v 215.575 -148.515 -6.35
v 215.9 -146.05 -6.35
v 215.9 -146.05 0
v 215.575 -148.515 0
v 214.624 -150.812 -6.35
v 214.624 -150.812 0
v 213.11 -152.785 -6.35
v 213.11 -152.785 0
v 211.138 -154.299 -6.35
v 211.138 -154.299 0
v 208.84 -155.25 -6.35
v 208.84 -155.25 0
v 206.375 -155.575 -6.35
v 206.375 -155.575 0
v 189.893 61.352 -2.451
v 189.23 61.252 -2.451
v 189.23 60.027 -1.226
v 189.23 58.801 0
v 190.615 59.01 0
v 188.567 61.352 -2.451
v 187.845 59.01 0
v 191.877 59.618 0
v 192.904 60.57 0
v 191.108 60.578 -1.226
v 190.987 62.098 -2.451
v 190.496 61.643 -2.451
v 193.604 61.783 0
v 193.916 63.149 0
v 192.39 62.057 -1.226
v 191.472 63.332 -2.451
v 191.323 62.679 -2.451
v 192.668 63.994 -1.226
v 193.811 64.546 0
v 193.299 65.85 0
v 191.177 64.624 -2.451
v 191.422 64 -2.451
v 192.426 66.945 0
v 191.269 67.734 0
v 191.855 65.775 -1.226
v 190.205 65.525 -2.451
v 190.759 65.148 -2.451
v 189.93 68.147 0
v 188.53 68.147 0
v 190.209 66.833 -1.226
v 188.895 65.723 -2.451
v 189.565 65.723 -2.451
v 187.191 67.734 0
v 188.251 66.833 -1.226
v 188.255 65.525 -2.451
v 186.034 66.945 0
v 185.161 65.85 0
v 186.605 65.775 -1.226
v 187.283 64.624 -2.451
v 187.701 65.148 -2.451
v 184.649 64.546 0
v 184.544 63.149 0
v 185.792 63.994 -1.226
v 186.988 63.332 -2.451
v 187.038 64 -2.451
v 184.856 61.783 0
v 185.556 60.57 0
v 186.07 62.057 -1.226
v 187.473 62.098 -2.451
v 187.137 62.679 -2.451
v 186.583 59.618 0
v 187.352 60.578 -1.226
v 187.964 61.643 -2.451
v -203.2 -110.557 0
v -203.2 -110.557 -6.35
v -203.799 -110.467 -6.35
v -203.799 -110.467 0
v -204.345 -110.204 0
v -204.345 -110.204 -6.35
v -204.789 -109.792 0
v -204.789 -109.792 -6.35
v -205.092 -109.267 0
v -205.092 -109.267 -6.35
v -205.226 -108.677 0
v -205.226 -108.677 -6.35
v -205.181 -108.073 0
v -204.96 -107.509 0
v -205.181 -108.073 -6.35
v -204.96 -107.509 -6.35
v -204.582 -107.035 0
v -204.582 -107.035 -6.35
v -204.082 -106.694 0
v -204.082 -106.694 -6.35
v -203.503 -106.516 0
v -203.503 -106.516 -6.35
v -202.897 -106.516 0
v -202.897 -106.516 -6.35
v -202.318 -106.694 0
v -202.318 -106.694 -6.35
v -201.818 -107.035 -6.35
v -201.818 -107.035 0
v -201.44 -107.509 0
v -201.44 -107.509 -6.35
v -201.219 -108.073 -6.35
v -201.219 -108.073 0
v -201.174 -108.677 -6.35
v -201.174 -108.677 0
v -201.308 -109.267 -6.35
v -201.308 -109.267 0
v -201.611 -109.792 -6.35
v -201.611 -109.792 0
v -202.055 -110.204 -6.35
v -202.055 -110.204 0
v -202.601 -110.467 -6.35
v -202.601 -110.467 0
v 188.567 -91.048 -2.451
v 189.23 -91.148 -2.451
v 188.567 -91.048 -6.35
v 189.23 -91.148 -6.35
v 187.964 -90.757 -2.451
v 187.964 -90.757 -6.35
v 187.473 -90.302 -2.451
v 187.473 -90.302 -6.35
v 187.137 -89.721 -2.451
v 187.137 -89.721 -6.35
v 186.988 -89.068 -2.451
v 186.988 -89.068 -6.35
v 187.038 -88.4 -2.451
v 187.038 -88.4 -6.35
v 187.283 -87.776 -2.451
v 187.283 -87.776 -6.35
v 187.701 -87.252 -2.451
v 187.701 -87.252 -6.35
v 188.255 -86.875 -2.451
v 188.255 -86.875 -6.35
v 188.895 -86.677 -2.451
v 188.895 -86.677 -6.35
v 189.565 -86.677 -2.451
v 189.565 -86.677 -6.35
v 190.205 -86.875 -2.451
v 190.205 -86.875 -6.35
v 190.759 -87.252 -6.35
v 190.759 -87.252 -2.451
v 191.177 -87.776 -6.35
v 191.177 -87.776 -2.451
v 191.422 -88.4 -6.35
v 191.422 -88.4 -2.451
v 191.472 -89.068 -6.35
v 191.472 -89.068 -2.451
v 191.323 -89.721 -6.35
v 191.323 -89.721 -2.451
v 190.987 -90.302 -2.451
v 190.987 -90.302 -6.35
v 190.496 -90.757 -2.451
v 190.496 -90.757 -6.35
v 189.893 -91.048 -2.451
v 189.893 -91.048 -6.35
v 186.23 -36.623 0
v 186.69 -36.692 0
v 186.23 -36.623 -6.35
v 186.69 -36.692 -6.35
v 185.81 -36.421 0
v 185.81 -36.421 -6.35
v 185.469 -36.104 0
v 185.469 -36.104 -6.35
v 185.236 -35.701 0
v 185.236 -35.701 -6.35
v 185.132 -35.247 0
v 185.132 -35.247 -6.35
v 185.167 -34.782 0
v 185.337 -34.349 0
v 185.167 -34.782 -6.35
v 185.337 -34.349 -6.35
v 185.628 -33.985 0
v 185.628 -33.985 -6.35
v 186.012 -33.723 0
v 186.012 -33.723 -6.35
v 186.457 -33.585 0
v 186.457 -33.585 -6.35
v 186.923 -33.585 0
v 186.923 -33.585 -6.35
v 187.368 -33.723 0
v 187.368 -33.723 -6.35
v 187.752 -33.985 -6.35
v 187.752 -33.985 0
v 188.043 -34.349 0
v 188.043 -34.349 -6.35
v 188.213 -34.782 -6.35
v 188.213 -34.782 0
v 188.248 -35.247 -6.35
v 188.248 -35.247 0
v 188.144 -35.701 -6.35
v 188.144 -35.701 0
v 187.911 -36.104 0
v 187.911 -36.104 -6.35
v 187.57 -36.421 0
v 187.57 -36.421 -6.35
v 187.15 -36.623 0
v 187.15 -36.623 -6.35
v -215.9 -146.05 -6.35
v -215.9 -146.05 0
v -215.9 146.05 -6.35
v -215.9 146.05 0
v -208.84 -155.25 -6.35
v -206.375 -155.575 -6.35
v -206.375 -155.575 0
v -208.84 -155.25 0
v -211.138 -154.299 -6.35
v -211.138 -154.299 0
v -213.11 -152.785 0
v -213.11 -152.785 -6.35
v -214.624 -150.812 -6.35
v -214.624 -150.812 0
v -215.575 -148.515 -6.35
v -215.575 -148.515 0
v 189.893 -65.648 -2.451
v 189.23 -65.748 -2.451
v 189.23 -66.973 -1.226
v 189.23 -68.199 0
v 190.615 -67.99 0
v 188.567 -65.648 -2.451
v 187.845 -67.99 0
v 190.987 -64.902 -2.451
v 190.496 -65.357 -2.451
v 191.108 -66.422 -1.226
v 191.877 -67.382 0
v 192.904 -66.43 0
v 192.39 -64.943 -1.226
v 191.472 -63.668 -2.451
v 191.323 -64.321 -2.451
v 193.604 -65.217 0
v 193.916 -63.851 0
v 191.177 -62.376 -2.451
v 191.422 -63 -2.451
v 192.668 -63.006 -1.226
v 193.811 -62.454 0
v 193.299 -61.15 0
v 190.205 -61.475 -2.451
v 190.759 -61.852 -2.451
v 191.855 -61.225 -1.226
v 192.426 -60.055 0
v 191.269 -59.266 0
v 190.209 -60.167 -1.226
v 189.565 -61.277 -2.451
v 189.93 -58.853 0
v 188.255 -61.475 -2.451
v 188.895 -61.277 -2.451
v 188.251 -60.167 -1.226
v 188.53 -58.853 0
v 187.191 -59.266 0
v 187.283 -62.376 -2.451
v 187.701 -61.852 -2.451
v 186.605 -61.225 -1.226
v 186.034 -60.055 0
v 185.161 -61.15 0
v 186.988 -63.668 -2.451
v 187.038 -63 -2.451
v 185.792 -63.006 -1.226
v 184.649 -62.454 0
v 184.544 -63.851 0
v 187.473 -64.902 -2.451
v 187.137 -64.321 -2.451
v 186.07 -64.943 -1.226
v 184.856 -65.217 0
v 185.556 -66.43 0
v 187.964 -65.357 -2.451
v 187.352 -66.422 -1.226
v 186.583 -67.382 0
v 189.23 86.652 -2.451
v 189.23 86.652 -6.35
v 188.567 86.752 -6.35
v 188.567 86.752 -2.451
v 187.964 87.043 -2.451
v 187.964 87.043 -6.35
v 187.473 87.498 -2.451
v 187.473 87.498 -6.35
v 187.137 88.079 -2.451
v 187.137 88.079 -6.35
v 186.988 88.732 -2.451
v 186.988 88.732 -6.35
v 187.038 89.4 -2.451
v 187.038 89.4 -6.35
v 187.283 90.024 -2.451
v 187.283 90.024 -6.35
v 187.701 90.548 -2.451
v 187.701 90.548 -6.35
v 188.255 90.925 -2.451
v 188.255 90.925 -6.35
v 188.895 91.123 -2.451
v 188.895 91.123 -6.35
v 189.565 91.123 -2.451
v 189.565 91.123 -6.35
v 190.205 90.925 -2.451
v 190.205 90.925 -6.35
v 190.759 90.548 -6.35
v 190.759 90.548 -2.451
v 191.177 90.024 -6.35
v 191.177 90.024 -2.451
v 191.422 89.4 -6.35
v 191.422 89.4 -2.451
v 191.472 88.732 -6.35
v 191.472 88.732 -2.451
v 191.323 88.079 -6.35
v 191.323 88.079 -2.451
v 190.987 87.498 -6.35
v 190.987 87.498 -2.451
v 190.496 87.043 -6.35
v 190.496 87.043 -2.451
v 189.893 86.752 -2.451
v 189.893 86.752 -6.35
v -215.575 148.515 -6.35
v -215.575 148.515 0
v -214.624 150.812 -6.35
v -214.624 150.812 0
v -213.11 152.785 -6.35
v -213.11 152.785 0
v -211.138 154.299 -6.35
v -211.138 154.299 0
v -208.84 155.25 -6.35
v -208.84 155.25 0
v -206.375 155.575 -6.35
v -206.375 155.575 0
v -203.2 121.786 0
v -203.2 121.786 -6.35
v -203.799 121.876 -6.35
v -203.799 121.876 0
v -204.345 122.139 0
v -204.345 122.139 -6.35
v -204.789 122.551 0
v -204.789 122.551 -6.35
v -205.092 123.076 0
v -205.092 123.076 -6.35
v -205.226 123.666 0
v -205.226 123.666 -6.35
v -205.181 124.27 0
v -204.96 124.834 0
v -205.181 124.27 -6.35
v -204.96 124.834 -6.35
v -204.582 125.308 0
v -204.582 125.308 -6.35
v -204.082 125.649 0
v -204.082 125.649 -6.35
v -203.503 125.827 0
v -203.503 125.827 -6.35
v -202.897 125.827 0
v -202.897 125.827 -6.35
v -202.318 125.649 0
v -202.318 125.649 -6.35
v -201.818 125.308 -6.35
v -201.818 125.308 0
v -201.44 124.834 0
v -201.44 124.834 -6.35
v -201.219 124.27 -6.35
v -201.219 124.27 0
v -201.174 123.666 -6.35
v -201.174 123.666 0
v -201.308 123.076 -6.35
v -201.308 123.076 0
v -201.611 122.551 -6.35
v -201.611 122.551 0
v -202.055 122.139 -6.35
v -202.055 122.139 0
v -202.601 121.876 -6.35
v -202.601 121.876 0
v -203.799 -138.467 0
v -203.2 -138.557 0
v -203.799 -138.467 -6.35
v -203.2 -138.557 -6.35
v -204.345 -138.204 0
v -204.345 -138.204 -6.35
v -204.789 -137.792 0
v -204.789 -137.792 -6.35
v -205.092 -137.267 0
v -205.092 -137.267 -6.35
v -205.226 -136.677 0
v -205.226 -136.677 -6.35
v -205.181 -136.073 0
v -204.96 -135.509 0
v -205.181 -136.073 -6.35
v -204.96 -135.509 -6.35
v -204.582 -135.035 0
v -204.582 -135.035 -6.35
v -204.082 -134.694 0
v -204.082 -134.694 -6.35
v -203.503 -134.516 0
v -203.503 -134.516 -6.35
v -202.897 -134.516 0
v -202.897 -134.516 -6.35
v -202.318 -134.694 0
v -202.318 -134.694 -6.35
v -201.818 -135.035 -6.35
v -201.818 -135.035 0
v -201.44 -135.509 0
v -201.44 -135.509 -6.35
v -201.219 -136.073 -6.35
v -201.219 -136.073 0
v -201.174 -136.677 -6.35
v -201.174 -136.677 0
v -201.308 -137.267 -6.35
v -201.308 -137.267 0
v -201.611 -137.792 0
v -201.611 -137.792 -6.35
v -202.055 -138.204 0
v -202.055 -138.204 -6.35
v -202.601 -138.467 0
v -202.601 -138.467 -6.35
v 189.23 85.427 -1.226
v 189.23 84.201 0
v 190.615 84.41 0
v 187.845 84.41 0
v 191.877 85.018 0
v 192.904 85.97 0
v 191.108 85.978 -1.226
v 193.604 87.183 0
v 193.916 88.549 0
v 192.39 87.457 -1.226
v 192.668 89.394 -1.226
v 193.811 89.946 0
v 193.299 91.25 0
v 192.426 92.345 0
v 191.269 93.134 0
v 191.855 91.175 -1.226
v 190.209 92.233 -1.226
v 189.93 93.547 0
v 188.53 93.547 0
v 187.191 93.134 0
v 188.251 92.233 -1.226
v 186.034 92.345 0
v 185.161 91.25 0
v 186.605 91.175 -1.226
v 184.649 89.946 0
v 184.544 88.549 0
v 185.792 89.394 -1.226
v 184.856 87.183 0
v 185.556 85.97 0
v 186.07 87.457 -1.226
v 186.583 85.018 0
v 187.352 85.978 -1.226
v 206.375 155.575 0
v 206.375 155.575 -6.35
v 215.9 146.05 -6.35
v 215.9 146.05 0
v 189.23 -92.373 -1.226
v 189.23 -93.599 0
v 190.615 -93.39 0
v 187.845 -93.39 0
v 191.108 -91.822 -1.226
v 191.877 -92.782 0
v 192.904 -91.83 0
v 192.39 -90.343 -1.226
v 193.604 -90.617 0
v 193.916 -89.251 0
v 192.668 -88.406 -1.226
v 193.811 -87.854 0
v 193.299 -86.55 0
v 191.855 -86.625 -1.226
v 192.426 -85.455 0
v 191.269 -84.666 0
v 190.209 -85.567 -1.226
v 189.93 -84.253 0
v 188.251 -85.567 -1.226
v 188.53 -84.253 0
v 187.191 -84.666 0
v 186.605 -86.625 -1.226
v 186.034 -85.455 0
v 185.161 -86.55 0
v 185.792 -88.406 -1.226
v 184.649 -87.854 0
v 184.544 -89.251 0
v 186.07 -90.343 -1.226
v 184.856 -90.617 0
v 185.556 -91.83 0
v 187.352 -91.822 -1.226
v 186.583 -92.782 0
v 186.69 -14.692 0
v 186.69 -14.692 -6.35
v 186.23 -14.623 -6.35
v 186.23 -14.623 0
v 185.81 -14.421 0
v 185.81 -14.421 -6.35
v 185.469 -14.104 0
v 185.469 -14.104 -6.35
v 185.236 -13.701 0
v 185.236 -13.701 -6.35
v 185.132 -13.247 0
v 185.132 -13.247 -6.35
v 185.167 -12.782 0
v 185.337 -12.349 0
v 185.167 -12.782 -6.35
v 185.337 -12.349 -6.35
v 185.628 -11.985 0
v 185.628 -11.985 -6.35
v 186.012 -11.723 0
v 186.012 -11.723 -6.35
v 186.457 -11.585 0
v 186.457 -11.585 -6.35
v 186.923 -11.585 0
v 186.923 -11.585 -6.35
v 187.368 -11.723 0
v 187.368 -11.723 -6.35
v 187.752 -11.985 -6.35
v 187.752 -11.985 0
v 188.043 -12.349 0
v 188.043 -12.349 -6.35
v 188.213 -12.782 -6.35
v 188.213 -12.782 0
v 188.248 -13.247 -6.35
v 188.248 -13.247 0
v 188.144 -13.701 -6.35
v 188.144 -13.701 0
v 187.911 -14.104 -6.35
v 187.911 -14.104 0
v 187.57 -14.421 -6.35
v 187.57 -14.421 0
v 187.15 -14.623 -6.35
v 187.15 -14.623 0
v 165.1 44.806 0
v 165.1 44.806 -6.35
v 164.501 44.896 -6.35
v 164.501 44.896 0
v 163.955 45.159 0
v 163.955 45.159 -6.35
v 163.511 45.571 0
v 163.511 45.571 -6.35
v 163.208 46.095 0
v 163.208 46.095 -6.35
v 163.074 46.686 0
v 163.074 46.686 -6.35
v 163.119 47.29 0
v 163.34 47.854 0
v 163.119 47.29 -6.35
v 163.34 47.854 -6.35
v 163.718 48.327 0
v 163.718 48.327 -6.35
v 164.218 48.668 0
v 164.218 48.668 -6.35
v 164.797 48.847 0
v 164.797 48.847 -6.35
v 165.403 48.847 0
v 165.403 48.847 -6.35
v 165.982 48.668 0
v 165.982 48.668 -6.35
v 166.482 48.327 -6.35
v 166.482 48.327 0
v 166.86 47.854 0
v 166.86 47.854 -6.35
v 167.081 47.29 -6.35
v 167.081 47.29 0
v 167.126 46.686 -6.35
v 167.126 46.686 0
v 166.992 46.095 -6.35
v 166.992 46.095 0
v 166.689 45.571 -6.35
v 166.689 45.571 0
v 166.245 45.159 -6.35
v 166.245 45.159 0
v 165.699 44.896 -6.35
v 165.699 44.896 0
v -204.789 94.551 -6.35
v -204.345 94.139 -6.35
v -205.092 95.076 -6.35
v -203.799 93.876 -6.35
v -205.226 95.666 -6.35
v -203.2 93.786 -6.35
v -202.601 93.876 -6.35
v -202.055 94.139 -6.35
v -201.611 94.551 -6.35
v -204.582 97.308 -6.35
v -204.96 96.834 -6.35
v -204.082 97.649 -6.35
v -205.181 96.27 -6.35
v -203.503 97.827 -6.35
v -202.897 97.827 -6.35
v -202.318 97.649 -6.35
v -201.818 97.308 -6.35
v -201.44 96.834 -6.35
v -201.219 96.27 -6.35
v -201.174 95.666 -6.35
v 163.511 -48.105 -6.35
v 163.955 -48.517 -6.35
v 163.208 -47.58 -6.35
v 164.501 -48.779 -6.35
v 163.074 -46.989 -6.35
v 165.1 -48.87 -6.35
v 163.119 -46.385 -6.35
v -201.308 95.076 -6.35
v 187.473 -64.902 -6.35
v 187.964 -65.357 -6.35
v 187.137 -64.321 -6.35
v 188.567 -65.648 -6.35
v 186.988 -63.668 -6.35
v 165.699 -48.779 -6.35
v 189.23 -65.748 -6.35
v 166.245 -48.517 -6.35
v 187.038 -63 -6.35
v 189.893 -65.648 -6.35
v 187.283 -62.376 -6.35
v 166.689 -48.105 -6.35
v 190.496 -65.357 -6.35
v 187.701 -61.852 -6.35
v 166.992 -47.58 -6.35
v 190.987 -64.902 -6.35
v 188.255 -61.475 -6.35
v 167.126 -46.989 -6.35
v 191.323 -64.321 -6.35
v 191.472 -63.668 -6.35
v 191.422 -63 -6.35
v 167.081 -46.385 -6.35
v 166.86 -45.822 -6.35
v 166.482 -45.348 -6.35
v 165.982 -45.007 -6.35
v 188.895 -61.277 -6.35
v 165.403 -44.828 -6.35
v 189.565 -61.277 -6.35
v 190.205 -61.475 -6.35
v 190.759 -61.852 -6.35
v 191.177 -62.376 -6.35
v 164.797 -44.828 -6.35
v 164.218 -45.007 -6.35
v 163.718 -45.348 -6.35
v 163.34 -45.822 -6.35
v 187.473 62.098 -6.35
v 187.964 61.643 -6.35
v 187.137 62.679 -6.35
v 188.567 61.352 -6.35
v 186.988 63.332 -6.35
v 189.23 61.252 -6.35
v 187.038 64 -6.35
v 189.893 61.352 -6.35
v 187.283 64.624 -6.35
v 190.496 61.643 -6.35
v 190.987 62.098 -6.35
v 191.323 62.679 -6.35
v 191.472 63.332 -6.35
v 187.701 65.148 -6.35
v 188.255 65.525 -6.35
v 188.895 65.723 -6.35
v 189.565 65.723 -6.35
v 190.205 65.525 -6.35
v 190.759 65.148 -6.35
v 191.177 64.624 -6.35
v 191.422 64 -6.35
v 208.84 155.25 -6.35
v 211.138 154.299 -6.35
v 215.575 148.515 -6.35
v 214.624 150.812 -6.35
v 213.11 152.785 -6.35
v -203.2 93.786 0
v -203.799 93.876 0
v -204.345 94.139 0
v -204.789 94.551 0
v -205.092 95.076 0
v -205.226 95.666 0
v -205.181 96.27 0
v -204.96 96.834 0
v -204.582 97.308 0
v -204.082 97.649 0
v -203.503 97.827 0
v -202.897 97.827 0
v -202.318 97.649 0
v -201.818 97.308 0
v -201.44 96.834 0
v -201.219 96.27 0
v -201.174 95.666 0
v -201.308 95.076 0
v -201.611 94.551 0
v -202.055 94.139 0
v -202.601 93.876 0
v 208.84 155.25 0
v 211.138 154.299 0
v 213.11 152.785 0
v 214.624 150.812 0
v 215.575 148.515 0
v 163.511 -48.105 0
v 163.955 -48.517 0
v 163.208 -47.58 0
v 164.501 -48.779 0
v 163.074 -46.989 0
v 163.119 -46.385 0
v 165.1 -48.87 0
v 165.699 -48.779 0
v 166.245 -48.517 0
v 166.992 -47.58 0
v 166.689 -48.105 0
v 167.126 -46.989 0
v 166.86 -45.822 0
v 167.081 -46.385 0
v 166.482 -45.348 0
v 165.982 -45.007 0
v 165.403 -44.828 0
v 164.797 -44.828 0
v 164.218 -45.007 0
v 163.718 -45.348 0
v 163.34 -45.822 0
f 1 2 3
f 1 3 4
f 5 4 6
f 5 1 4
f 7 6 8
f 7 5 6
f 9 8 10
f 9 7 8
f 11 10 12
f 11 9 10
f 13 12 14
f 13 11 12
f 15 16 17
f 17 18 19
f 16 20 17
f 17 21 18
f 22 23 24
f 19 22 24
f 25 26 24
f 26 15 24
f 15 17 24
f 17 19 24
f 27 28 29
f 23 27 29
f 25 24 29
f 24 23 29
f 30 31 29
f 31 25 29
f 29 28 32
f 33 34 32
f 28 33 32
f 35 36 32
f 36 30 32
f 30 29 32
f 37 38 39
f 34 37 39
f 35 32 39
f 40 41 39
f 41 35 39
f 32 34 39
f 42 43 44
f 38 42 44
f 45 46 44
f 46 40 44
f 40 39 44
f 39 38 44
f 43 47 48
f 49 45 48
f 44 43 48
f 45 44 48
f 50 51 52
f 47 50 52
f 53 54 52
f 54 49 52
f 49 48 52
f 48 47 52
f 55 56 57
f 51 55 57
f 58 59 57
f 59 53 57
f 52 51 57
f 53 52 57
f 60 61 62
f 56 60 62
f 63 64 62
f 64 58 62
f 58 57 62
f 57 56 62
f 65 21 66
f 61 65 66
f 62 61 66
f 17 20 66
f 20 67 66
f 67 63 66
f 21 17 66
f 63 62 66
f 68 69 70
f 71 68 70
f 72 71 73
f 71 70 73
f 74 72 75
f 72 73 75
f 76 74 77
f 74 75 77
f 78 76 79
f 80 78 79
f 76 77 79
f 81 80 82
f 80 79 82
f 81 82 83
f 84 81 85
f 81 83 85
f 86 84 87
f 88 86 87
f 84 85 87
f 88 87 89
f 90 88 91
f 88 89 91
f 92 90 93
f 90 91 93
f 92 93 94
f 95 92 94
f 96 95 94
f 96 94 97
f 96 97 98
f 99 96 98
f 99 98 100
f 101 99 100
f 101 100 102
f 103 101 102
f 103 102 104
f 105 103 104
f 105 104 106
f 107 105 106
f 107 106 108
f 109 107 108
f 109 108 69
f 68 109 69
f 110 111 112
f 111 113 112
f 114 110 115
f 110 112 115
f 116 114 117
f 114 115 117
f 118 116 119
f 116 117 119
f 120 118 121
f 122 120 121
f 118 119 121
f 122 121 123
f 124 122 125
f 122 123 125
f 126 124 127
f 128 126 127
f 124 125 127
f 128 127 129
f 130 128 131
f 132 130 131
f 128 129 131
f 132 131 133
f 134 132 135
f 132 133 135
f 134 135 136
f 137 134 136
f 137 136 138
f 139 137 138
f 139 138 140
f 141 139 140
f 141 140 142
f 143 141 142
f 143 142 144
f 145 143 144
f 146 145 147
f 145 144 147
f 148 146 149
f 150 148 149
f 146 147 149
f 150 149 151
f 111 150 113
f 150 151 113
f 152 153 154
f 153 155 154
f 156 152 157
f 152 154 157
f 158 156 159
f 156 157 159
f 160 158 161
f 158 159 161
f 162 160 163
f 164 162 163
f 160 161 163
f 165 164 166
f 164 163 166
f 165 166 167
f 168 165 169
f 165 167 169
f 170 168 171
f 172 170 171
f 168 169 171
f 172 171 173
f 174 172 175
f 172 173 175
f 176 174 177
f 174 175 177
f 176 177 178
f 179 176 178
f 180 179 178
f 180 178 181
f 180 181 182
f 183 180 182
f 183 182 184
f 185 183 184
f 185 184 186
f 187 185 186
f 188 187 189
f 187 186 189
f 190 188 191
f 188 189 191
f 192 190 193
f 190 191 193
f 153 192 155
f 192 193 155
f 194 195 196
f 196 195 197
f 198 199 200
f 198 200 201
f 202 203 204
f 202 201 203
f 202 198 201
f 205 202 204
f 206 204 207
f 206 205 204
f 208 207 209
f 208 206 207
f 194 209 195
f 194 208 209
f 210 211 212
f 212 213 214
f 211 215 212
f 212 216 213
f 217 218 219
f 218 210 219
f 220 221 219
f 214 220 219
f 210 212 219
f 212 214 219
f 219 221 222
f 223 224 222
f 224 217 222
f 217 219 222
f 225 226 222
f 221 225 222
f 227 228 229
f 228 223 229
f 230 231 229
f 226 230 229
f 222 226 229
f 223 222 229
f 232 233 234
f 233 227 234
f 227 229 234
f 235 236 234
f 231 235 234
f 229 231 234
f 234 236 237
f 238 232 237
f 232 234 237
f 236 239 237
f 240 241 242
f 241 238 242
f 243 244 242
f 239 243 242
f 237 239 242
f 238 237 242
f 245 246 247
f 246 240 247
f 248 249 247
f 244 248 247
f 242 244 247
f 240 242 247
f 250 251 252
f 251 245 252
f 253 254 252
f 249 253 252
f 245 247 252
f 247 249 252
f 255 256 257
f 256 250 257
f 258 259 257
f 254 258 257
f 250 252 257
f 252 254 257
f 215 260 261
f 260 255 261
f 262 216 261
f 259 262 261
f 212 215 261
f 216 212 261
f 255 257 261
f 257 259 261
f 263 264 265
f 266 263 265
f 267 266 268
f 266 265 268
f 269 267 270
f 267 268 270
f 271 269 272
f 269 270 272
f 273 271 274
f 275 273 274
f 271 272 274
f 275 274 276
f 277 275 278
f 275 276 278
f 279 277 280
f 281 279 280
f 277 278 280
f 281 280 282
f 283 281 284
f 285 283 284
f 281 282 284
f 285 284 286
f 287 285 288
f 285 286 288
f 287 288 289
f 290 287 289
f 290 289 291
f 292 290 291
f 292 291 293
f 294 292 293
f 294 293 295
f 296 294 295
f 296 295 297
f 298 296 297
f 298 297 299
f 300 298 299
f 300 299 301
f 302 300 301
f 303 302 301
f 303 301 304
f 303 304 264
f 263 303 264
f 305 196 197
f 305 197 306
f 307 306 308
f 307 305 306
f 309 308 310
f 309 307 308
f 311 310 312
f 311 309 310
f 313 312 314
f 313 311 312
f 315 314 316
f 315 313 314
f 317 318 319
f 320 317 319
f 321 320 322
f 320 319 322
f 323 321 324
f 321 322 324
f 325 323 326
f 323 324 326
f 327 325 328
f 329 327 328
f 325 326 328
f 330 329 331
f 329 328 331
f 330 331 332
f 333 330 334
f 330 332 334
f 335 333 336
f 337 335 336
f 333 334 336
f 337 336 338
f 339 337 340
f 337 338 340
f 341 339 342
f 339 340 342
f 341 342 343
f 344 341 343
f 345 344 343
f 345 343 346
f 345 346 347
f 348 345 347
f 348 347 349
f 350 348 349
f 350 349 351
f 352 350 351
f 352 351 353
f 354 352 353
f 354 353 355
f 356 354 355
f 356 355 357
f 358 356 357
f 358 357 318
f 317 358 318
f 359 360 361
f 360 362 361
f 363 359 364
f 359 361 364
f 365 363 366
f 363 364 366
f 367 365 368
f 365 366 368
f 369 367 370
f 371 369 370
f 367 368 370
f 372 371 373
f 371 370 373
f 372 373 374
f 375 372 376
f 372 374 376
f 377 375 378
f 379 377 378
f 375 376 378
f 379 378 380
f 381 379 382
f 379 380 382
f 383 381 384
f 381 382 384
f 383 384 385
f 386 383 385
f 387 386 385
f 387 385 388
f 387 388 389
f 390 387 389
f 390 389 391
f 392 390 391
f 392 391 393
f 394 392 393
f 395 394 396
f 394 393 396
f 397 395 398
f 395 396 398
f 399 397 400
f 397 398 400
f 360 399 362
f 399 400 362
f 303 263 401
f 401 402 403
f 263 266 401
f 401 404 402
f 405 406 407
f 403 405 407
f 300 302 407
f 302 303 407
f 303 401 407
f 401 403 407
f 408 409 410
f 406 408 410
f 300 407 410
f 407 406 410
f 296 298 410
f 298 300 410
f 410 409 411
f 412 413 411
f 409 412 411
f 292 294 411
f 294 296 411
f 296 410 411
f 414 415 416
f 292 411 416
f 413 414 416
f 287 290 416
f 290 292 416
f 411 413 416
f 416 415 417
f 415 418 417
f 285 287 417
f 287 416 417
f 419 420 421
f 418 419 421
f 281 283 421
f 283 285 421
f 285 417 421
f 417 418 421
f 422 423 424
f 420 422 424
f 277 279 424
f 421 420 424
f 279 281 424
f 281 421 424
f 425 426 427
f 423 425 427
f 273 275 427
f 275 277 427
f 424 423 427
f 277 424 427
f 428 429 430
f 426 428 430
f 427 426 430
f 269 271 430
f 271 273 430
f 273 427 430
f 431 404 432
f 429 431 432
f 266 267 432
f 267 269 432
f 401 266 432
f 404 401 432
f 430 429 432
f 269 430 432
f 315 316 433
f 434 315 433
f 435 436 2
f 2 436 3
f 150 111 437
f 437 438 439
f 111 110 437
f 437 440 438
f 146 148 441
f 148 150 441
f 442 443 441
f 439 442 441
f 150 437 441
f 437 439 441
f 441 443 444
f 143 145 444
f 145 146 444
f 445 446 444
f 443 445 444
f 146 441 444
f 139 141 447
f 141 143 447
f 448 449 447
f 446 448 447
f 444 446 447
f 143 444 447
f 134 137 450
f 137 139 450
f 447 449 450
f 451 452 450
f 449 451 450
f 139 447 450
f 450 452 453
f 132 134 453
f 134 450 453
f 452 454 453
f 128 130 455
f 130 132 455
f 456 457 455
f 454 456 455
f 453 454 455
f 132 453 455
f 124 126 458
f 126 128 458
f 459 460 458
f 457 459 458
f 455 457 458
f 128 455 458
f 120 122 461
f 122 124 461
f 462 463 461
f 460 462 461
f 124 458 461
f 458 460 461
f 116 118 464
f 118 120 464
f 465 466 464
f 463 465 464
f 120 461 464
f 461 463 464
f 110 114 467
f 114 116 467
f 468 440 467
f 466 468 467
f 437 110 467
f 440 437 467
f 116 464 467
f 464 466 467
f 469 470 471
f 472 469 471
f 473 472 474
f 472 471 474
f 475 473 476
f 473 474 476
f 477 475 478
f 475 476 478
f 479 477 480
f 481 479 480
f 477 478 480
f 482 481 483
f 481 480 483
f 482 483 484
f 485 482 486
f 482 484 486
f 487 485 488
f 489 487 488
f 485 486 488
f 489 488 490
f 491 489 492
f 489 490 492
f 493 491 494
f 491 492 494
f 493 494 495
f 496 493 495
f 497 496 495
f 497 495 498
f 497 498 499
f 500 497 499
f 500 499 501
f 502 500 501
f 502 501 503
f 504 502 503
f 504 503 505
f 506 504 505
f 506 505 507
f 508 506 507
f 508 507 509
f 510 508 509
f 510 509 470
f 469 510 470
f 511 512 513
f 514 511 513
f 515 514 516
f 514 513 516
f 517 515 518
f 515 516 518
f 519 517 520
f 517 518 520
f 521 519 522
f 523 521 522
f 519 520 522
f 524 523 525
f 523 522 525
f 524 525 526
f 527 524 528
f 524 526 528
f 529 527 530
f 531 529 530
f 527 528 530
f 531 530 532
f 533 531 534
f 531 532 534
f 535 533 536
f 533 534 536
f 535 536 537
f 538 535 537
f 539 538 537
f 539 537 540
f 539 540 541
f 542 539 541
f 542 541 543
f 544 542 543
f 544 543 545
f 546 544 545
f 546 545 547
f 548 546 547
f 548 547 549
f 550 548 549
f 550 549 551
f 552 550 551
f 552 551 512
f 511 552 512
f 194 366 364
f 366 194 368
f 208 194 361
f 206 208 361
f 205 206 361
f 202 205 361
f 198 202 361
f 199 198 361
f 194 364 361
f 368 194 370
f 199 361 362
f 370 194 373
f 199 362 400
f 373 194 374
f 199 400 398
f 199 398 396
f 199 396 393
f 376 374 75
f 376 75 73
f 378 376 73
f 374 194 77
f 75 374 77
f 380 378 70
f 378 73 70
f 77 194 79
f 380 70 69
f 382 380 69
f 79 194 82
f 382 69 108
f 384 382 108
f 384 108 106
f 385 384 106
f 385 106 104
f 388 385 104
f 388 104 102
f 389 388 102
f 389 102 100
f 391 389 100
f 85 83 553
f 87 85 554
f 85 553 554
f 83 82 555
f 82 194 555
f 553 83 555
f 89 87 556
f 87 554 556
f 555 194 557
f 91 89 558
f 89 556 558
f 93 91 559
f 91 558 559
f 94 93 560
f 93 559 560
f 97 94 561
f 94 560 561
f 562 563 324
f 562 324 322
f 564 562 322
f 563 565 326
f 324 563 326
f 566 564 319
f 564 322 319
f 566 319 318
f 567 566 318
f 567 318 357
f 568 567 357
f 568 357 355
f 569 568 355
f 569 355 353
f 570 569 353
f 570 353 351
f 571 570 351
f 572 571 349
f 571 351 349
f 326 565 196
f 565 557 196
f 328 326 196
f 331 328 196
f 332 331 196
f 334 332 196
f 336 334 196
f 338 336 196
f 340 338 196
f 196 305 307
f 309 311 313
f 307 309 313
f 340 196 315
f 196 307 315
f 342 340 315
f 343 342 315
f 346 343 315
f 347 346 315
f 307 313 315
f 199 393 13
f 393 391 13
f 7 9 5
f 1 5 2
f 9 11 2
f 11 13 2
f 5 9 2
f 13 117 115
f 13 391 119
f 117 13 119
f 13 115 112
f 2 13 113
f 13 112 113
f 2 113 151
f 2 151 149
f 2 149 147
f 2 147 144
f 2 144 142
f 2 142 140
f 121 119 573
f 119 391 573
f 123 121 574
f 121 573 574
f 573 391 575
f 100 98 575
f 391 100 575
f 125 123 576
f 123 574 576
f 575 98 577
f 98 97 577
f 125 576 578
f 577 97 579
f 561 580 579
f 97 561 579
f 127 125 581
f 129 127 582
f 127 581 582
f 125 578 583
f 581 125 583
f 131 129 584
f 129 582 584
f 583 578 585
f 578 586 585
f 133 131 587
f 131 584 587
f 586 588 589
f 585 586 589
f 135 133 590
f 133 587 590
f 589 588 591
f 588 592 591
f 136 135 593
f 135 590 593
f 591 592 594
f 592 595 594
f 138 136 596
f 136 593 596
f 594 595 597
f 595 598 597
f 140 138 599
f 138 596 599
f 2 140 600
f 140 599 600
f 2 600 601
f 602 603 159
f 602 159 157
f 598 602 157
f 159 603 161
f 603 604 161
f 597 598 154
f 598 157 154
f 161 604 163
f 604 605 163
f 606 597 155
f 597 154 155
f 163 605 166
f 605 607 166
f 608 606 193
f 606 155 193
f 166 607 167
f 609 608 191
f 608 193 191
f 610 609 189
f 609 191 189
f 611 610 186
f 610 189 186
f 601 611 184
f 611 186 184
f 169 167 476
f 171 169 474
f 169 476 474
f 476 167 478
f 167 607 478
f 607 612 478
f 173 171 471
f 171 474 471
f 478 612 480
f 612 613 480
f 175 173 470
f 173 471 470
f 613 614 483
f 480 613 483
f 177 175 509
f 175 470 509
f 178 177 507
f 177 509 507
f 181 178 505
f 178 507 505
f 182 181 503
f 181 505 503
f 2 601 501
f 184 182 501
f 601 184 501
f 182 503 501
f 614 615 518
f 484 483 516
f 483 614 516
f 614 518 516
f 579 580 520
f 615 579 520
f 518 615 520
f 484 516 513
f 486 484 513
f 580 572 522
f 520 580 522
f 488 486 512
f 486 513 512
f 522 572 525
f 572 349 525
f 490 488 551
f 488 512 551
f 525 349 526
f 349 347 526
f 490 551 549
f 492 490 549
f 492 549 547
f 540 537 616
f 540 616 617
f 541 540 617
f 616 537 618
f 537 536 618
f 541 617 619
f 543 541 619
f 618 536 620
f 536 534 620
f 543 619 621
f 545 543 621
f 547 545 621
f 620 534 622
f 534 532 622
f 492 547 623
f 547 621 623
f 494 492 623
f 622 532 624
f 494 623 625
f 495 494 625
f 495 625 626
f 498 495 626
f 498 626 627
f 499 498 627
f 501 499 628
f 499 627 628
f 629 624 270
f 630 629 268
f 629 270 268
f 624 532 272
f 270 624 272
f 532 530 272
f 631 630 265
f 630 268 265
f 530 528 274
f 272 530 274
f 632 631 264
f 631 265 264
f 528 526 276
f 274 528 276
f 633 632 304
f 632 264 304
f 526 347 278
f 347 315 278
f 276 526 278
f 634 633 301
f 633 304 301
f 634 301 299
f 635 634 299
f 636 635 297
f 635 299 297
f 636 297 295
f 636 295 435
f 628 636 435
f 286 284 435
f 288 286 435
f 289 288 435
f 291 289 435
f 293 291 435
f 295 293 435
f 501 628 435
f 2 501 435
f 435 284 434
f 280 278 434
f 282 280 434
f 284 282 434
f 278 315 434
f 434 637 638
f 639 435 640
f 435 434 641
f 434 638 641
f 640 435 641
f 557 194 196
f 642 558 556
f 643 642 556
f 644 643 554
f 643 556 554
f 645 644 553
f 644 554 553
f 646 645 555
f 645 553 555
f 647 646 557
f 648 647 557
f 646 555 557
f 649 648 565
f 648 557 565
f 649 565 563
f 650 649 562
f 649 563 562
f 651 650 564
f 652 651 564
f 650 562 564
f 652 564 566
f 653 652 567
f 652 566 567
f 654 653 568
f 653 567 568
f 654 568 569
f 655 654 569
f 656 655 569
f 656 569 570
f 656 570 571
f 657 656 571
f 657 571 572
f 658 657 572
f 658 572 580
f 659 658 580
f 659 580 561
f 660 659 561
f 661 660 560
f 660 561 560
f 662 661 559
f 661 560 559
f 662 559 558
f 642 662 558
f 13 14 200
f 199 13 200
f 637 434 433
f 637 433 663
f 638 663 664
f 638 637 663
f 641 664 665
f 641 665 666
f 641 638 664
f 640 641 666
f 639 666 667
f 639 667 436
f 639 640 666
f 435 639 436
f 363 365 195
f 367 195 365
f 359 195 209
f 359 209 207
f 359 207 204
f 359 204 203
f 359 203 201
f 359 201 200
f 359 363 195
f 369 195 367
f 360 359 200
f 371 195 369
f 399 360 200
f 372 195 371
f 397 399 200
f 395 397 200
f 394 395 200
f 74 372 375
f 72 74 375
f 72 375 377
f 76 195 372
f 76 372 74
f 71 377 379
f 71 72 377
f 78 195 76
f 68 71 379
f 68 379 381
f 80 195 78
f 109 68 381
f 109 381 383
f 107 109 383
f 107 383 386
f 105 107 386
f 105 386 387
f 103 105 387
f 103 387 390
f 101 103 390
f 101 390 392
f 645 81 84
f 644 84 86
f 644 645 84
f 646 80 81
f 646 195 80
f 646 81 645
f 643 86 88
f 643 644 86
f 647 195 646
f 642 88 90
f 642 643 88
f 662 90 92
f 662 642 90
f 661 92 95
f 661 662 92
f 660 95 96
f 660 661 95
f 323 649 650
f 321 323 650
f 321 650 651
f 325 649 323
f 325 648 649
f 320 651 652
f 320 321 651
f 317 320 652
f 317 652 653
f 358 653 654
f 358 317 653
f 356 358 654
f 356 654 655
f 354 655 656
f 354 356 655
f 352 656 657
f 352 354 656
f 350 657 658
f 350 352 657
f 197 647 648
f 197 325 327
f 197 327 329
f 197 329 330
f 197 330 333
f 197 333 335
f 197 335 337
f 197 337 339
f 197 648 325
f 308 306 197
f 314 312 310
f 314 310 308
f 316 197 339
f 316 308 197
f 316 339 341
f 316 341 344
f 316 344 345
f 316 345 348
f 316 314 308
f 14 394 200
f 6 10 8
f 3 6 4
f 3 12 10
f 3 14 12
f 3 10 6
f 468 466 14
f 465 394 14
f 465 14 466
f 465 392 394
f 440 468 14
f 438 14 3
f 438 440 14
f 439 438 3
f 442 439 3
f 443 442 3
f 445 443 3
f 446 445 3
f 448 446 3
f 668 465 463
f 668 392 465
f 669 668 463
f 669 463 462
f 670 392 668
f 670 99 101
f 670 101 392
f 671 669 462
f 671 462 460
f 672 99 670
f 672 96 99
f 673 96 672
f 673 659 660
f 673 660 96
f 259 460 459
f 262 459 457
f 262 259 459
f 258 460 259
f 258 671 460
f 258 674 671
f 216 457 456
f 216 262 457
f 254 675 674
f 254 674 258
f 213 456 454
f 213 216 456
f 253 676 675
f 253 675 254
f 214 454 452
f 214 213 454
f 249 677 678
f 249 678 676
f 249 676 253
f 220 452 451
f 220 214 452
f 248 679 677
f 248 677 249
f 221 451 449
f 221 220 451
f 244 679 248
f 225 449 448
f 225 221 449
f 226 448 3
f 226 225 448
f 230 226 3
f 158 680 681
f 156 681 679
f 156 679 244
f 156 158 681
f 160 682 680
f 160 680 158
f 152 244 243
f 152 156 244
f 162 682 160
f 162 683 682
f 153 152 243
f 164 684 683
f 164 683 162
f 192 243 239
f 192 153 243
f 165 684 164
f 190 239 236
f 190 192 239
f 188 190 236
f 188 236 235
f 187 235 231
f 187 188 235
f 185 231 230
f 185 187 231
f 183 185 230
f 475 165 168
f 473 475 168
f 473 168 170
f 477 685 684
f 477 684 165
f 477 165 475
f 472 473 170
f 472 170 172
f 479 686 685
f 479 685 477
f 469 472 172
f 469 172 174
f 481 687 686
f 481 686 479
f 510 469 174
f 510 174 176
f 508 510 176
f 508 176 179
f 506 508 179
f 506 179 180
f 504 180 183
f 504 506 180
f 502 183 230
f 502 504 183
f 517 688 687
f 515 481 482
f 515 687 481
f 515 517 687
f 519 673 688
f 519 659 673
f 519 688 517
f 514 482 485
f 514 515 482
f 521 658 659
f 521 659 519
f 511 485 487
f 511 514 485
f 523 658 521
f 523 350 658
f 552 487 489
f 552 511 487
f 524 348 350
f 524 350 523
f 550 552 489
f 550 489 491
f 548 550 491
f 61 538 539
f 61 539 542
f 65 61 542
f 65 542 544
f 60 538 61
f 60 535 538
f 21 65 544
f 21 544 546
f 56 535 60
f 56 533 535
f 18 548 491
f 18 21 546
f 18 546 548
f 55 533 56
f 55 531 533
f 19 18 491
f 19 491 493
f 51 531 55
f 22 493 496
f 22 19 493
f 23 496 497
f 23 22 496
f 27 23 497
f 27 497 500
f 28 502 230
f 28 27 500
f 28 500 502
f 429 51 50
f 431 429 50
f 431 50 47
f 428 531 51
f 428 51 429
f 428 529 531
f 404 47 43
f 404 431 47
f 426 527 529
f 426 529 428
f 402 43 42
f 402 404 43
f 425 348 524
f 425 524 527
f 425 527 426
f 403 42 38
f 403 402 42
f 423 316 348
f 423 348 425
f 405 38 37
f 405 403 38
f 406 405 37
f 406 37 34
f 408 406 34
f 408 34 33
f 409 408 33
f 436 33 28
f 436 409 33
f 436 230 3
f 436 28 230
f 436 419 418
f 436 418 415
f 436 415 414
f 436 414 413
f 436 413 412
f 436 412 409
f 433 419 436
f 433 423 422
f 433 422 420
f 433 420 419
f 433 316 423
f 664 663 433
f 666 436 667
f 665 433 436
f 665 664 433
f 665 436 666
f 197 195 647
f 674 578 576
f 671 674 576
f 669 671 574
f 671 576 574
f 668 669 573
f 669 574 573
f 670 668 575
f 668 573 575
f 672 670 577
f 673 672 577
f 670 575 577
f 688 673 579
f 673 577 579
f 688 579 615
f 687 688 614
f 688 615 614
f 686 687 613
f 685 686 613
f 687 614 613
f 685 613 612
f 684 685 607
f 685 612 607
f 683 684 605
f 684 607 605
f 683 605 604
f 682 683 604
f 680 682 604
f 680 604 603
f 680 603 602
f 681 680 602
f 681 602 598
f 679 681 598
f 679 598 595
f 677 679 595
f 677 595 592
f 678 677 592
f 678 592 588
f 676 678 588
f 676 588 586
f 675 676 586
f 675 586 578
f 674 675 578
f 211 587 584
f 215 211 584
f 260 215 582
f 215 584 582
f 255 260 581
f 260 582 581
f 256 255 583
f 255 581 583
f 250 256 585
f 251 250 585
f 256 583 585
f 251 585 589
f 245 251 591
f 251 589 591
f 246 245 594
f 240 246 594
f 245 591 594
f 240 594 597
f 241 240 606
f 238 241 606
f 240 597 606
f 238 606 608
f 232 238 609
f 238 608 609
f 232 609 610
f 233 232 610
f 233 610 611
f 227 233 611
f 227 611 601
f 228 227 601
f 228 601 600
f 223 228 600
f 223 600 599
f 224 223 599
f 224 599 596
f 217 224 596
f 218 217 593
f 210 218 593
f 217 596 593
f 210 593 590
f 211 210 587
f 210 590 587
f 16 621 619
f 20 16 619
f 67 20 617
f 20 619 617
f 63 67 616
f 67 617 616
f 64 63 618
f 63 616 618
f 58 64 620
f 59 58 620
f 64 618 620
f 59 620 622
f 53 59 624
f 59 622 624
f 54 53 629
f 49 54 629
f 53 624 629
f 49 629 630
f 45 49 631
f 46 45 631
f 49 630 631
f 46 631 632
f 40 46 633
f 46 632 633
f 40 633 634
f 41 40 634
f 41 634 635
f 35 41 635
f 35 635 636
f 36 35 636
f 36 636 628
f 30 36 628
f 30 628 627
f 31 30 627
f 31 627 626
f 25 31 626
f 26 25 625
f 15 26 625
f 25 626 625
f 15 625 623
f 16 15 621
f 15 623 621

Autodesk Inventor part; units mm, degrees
ref_plane "YZ Plane" through (0, 0, 0) normal (1, 0, 0) x (0, 1, 0)
ref_plane "XZ Plane" through (0, 0, 0) normal (0, 1, 0) x (-1, 0, 0)
ref_plane "XY Plane" through (0, 0, 0) normal (0, 0, 1) x (1, 0, 0)
sketch "Sketch1" plane through (0, 0, 0) normal (0, 0, 1) x (1, 0, 0)
  line L0 (0, 217.805) -> (0, -217.805) projected
  line L1 (-302.26, 0) -> (302.26, 0) projected
  line L2 (215.9, -155.575) -> (-215.9, -155.575)
  line L3 (-215.9, -155.575) -> (-215.9, 155.575)
  line L4 (-215.9, 155.575) -> (215.9, 155.575)
  line L5 (215.9, 155.575) -> (215.9, -155.575)
  line L6 (215.9, -155.575) -> (-215.9, 155.575) construction
  line L7 (-215.9, -155.575) -> (215.9, 155.575) construction
  line L8 (186.69, -13.13) -> (186.69, -35.13) construction
  line L9 (189.23, 88.9) -> (189.23, 63.5) construction
  line L10 (189.23, -63.5) -> (189.23, -88.9) construction
  point P0 (0, 0)
  point P1 (-203.2, 123.818)
  point P2 (-203.2, 95.818)
  point P3 (-203.2, -108.525)
  point P4 (-203.2, -136.525)
  point P5 (165.1, 46.8376)
  point P6 (165.1, -46.8376)
  point P7 (186.69, -24.13)
  point P8 (189.23, -76.2)
  point P9 (189.23, 76.2)
  dimension "d0" = 311.15
  dimension "d1" = 431.8
  dimension "d2" = 28
  dimension "d3" = 28
  dimension "d4" = 203.2
  dimension "d16" = 204.343
  dimension "d17" = 19.05
  dimension "d18" = 31.757
  dimension "d19" = 93.6752
  dimension "d20" = 46.8376
  dimension "d21" = 165.1
  dimension "d29" = 22
  dimension "d31" = 186.69
  dimension "d44" = 25.4
  dimension "d45" = 25.4
  dimension "d46" = 24.13
  dimension "d47" = 76.2
  dimension "d48" = 76.2
  dimension "d57" = 189.23
extrude "Extrusion1" add sketch "Sketch1" against normal blind 6.35
hole "Hole1-Tap M5" at (-203.2, 123.818, 0) at (-203.2, 95.818, 0) at (-203.2, -108.525, 0) at (-203.2, -136.525, 0) direction (0, 0, -1) diameter 4.064 end through all
hole "Hole2-Tap M5" at (165.1, 46.8376, 0) at (165.1, -46.8376, 0) direction (0, 0, -1) diameter 4.064 end through all
hole "Hole3-Tap M4" at (186.69, -13.13, 0) at (186.69, -35.13, 0) direction (0, 0, -1) diameter 3.1242 end through all
fillet "Fillet1" radius 9.525 4 edges at (-215.9, 155.575, -3.175) (215.9, 155.575, -3.175) (215.9, -155.575, -3.175) (-215.9, -155.575, -3.175)
hole "Hole4 CSINK M4" at (189.23, -88.9, 0) at (189.23, 88.9, 0) at (189.23, 63.5, 0) at (189.23, -63.5, 0) direction (0, 0, -1) diameter 4.4958 end through all countersink diameter 9.398 countersink angle 90 clearance for "Flat Head Machine Screw" size "M4" standard "Ansi Metric M Profile"
equation "\"d20\" = 0.5 * d19"
properties material "ACRYLIC, CLEAR"
